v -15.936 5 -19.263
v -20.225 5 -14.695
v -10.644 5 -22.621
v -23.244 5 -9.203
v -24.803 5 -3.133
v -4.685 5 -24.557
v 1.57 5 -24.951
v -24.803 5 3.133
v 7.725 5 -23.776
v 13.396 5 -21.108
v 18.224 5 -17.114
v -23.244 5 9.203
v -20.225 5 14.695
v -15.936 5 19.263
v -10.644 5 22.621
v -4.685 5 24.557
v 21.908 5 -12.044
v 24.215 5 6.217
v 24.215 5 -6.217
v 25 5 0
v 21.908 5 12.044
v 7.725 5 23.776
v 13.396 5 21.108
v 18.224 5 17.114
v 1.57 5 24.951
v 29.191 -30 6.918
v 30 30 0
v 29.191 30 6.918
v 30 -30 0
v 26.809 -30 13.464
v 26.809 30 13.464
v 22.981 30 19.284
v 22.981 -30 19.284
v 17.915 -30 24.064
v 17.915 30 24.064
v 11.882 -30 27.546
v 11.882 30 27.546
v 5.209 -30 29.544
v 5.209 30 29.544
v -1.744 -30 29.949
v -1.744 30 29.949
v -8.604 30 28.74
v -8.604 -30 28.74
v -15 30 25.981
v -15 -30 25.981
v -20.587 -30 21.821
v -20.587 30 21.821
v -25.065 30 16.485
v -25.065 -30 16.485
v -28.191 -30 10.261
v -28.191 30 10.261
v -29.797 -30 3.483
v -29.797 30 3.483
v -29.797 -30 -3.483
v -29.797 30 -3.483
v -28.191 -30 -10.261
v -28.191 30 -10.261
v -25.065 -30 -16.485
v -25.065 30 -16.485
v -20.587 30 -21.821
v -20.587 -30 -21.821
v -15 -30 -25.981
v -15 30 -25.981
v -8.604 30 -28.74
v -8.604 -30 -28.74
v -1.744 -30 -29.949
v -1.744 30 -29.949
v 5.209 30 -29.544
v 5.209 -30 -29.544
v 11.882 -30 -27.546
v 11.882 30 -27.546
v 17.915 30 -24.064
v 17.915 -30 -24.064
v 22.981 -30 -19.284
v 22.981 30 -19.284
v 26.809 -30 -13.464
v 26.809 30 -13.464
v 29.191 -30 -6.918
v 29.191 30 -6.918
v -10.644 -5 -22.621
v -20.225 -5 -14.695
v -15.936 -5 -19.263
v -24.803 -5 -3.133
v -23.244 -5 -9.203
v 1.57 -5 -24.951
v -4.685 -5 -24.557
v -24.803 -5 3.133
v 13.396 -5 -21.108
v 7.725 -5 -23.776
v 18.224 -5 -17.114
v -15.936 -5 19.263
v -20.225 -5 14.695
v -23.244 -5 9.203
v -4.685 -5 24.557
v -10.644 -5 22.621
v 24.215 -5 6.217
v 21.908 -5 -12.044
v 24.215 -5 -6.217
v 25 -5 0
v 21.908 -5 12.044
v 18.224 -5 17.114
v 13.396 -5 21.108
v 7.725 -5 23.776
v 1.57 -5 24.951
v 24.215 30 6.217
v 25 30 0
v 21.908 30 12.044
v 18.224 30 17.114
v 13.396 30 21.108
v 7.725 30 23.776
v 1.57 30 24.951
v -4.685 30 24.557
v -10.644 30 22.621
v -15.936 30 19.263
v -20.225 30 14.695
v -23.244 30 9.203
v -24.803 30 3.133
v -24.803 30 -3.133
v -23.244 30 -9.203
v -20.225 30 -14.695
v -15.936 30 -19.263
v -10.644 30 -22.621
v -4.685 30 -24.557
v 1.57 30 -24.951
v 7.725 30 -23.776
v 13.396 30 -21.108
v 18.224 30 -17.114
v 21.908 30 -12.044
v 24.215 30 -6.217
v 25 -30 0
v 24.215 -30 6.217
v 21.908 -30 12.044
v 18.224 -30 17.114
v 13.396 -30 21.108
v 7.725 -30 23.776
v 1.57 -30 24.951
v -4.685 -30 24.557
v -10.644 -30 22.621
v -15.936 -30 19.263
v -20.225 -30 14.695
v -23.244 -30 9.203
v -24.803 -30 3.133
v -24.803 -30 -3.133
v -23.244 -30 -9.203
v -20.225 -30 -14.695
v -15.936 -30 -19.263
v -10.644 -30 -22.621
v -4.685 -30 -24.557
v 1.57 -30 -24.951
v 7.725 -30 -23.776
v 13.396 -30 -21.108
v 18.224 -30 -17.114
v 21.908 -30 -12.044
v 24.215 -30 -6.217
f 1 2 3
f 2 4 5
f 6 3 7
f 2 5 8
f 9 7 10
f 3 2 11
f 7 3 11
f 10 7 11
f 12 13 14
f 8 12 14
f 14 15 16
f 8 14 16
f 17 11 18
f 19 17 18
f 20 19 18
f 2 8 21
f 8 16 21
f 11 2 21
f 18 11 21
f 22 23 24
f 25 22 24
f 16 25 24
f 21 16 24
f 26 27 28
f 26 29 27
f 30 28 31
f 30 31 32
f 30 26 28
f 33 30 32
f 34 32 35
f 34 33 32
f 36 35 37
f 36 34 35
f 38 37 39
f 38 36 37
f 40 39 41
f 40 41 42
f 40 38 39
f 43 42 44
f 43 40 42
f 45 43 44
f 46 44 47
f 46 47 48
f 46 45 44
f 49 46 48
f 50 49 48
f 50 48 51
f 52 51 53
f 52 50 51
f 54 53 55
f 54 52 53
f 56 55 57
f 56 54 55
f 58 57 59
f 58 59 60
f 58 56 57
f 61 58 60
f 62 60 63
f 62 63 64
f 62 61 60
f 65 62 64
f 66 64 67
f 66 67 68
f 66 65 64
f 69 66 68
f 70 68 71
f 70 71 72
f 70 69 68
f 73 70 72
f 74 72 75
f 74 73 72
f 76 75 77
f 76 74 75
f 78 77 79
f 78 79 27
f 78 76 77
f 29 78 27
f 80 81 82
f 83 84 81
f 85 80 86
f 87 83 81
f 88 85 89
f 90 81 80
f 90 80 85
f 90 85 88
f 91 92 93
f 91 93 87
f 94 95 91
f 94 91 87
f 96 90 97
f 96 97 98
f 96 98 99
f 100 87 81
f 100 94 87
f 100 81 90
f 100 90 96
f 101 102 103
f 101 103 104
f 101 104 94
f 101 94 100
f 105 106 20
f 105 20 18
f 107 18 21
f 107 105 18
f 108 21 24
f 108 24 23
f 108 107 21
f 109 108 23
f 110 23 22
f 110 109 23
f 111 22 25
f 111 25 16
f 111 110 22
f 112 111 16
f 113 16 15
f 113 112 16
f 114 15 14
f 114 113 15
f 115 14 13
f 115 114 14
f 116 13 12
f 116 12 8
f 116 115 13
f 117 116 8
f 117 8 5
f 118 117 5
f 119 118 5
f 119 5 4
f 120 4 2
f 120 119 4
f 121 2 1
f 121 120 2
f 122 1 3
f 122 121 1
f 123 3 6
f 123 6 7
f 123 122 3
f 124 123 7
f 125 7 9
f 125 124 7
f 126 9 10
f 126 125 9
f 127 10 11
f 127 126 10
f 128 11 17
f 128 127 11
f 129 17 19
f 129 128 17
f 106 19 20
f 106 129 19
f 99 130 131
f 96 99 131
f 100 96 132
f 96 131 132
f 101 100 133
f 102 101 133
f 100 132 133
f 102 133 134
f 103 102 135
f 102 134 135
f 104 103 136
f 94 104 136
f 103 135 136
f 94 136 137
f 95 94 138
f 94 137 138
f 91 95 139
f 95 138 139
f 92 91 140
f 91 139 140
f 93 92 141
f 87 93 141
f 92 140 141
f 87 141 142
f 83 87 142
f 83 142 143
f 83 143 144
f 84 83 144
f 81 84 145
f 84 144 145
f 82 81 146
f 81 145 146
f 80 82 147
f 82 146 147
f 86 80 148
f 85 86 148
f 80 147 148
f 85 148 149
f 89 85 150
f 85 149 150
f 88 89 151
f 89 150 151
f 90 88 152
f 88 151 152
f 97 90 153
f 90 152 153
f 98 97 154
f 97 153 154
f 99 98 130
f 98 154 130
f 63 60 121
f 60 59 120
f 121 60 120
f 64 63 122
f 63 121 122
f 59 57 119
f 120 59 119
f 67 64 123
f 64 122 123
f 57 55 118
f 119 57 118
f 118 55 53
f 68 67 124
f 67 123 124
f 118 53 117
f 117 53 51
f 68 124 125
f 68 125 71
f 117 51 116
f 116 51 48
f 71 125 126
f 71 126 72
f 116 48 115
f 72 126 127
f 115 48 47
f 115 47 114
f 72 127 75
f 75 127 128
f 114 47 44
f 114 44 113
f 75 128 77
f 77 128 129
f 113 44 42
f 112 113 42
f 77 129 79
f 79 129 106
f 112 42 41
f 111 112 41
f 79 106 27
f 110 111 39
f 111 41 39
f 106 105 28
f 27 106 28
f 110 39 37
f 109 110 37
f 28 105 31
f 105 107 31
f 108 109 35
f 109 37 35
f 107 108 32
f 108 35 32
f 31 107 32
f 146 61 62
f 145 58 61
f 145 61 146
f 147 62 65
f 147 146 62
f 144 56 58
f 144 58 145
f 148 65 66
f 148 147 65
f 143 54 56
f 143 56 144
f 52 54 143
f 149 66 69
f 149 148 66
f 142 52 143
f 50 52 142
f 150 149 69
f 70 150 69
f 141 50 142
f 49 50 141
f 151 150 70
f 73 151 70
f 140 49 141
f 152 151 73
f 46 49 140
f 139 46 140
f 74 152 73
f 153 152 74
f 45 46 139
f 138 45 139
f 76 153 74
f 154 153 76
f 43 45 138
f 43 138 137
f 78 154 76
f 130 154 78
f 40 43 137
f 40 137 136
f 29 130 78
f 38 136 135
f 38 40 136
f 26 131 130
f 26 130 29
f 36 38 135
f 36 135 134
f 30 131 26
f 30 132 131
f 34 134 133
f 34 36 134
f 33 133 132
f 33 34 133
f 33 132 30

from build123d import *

# Parameters (mm, degrees)
F0_R     = 30
F1_DEPTH = 30
F2_R     = 25
F3_DEPTH = 25


with BuildPart() as f1:
    # F0 (on Front) → F1 (new body)
    with BuildSketch(Plane.XZ):
        Circle(F0_R)
    extrude(amount=F1_DEPTH)

    # F2 (on face) → F3 (cut)
    with BuildSketch(Plane.XZ.offset(30)):
        Circle(F2_R)
    extrude(amount=-F3_DEPTH, mode=Mode.SUBTRACT)

    # F4: F1 across plane


with BuildPart() as f1_1:
    add(f1.part)
    add(f1.part.mirror(Plane.XZ))


solid = f1_1.part
